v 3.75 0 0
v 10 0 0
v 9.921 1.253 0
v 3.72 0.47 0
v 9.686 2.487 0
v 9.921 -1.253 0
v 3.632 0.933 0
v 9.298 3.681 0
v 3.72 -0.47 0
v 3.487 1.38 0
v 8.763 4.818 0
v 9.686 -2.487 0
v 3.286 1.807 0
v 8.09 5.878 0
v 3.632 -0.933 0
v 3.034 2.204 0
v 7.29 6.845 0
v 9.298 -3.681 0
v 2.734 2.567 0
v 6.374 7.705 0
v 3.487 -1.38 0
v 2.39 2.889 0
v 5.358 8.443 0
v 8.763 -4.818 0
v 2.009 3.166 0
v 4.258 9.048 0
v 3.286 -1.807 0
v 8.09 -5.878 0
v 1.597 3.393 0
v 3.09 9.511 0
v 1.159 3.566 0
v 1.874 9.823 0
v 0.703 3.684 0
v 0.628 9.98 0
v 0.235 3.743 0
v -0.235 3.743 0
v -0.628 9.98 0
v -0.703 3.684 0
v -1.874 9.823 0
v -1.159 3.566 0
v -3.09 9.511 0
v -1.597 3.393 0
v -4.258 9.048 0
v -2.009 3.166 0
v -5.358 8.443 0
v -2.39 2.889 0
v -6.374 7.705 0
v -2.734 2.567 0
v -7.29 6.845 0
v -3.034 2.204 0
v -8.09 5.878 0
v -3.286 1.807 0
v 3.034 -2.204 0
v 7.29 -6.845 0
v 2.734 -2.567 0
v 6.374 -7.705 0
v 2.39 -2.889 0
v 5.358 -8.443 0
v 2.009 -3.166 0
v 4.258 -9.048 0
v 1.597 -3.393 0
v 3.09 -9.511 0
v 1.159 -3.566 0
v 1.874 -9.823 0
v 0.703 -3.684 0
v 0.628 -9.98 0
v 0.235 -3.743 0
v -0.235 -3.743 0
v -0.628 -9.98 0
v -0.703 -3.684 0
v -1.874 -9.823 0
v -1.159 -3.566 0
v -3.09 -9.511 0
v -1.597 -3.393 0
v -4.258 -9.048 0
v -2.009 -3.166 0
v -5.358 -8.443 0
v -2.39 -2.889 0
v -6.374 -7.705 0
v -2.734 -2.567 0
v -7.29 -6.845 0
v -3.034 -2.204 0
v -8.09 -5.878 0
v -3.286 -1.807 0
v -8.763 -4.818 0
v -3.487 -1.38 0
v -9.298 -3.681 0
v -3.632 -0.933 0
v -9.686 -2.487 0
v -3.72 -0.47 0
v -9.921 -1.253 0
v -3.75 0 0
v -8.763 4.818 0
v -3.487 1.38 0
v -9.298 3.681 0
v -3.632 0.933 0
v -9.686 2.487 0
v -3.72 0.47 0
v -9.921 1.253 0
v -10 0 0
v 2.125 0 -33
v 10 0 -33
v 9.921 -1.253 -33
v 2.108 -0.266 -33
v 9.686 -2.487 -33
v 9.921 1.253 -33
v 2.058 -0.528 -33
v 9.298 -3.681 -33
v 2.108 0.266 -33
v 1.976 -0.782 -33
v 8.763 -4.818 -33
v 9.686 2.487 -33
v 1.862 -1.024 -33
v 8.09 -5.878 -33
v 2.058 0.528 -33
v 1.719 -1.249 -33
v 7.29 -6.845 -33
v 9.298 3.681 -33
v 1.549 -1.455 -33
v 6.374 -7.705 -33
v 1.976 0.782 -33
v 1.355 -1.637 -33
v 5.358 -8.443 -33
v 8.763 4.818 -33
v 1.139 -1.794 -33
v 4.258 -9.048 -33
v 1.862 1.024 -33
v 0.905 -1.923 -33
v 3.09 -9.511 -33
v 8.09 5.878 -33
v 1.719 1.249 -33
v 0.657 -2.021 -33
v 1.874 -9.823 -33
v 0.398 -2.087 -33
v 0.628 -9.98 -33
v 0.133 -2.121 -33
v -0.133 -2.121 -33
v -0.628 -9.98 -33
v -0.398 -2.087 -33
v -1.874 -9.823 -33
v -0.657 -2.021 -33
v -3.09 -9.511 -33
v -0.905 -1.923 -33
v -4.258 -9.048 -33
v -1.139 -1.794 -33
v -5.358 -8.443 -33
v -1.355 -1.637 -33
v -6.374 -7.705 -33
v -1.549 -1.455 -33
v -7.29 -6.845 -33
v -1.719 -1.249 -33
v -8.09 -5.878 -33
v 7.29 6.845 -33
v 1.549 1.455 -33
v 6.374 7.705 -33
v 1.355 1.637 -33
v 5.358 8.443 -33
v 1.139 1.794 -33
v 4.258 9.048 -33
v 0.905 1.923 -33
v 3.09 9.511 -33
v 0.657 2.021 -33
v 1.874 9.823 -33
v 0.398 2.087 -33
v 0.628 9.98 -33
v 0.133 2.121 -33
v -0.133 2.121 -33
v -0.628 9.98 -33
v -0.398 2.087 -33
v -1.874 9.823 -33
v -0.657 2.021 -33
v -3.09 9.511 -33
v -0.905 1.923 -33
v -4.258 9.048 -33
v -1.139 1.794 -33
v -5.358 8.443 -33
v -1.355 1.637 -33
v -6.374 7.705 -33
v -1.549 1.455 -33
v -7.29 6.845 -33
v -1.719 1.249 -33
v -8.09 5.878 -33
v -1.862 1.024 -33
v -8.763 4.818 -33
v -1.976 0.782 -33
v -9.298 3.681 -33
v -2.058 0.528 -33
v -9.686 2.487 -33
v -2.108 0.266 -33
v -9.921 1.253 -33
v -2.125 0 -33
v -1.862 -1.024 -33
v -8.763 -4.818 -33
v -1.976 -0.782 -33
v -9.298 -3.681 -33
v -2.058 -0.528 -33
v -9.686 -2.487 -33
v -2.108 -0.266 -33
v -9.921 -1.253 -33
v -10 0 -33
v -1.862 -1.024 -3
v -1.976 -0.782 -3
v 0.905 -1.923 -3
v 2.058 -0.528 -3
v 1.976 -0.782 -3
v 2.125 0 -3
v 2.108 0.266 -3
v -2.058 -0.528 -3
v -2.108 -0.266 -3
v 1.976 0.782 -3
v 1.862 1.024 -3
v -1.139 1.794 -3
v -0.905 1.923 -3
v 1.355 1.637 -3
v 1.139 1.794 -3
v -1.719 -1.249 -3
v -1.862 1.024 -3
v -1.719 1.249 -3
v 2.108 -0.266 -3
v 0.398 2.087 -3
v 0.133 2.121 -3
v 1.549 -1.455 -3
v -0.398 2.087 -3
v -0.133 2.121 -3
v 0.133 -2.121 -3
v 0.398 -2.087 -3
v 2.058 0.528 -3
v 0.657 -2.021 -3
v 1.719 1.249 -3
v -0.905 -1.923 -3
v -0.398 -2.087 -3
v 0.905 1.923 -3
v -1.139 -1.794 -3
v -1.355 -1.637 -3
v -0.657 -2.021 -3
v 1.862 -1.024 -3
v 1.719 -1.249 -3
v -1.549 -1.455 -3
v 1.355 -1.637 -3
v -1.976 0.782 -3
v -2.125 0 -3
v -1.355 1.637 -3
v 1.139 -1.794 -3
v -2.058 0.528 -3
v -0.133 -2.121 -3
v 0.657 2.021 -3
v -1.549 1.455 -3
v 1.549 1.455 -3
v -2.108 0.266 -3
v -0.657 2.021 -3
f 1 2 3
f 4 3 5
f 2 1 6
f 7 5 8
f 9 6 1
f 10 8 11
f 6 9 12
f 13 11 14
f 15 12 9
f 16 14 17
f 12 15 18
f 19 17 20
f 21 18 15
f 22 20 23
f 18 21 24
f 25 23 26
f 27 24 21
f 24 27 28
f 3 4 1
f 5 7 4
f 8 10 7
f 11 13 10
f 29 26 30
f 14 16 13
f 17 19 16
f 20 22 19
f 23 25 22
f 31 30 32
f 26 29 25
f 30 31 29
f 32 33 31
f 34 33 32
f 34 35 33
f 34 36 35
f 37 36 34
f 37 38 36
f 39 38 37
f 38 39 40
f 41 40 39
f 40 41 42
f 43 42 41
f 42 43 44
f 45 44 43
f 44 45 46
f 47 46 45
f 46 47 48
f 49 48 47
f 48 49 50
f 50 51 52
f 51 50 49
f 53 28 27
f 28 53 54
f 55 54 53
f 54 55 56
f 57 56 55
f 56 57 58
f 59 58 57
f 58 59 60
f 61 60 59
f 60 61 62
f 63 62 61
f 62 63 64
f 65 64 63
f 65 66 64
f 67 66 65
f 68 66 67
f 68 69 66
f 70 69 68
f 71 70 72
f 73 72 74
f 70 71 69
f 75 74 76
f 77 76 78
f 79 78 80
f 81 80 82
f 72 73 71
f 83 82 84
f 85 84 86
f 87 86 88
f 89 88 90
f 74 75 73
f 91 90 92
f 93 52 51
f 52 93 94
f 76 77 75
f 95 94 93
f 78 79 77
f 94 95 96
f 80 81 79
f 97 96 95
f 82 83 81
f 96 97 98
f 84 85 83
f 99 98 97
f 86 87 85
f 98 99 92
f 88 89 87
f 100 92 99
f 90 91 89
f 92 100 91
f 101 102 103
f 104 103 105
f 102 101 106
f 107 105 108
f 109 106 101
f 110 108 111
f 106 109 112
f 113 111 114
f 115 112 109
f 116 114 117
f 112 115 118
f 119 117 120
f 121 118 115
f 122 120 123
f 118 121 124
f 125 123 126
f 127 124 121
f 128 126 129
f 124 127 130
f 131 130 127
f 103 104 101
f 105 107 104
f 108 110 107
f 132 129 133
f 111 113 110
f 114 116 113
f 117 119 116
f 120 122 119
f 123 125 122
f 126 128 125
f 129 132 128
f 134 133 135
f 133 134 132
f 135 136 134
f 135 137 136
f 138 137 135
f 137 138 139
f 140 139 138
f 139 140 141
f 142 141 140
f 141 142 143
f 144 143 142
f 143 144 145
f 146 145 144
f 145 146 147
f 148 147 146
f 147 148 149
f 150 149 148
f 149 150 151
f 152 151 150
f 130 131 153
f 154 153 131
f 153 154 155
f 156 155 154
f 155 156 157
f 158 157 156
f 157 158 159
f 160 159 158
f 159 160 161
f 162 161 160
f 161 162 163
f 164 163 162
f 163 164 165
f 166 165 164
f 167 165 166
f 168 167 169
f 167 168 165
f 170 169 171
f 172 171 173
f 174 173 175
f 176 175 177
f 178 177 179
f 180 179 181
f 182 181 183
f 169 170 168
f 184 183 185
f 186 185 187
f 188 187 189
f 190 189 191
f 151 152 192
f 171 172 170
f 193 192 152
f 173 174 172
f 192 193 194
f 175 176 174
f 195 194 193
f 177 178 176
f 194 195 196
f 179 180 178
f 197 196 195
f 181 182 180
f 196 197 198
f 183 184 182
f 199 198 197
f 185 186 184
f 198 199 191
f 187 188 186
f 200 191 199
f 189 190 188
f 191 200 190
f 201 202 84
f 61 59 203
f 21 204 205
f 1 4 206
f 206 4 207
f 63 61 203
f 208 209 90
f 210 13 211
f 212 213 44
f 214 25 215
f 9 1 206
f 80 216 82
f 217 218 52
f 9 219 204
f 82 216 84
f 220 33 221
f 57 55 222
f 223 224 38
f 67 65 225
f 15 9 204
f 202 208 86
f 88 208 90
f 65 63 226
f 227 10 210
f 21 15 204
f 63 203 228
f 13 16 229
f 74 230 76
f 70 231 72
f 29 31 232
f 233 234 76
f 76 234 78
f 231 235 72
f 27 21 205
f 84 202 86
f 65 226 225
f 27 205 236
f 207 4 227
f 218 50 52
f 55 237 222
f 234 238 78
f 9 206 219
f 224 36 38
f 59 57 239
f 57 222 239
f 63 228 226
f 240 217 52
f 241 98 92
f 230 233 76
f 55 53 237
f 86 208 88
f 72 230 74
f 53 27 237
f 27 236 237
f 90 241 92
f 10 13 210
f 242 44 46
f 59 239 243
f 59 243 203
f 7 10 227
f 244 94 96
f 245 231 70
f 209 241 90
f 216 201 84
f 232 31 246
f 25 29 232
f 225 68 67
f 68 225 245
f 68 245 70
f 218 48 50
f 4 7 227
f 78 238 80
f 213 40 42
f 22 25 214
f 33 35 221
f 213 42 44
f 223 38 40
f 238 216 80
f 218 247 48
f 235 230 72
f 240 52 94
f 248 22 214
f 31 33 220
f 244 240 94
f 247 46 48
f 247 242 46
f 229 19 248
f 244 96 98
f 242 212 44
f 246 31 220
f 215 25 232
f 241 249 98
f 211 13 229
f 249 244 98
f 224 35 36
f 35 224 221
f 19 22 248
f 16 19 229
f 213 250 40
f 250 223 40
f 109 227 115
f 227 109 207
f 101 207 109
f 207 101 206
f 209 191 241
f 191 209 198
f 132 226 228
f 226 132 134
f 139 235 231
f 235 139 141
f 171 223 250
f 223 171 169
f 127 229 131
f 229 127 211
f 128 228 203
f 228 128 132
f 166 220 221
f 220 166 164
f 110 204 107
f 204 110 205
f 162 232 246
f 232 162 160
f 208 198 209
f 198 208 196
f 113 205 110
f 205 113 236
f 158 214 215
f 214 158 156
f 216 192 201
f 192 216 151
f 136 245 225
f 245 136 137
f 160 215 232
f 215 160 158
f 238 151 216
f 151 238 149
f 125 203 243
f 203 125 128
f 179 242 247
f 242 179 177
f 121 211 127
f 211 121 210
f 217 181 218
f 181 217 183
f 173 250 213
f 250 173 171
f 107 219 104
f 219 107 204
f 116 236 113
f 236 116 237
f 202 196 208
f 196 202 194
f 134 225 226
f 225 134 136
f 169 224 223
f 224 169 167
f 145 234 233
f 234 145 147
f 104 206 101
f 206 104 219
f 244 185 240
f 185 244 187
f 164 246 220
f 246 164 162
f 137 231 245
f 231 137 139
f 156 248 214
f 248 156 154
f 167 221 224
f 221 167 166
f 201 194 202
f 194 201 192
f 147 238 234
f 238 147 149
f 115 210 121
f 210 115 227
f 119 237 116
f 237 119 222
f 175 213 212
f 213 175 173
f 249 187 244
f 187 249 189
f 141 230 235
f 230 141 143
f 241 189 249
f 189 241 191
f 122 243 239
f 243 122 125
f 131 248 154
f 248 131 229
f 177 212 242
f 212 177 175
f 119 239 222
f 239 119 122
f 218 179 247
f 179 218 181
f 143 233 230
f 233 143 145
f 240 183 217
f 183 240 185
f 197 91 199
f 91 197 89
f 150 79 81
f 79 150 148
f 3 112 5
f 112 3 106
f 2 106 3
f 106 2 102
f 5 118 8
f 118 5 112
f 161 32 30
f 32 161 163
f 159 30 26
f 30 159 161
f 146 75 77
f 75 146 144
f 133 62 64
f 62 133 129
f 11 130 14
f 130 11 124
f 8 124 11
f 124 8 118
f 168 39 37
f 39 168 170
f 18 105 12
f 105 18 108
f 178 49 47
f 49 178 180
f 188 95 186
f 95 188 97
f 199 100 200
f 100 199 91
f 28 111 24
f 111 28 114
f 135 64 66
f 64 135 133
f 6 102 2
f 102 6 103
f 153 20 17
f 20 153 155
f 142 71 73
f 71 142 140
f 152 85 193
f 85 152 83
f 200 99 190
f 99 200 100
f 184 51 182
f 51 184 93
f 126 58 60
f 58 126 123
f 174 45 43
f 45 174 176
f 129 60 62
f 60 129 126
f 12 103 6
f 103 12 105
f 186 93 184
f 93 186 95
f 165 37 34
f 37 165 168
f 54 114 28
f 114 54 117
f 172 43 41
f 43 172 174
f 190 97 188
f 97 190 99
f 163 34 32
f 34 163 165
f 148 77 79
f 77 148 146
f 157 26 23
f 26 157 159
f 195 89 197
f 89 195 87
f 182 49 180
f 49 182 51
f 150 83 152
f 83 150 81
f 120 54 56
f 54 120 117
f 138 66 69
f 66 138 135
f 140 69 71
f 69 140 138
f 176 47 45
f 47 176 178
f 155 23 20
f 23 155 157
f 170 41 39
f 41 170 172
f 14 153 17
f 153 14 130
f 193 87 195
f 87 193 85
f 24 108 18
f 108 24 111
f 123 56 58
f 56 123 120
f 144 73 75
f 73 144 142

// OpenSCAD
$fn = 50;


difference() {
	union() {
		translate(v = [0, 0, -33.0000000000]) {
			cylinder(h = 33, r = 10.0000000000);
		}
	}
	union() {
		translate(v = [0, 0, 0]) {
			rotate(a = [0, 0, 0]) {
				difference() {
					union() {
						#translate(v = [0, 0, -33.0000000000]) {
							cylinder(h = 33, r = 2.0000000000);
						}
						#translate(v = [0, 0, -3]) {
							cylinder(h = 3, r1 = 2.1250000000, r2 = 3.7500000000);
						}
						#translate(v = [0, 0, -33.0000000000]) {
							cylinder(h = 33, r = 2.1250000000);
						}
						#translate(v = [0, 0, -33.0000000000]) {
							cylinder(h = 33, r = 2.0000000000);
						}
					}
					union();
				}
			}
		}
	}
}
